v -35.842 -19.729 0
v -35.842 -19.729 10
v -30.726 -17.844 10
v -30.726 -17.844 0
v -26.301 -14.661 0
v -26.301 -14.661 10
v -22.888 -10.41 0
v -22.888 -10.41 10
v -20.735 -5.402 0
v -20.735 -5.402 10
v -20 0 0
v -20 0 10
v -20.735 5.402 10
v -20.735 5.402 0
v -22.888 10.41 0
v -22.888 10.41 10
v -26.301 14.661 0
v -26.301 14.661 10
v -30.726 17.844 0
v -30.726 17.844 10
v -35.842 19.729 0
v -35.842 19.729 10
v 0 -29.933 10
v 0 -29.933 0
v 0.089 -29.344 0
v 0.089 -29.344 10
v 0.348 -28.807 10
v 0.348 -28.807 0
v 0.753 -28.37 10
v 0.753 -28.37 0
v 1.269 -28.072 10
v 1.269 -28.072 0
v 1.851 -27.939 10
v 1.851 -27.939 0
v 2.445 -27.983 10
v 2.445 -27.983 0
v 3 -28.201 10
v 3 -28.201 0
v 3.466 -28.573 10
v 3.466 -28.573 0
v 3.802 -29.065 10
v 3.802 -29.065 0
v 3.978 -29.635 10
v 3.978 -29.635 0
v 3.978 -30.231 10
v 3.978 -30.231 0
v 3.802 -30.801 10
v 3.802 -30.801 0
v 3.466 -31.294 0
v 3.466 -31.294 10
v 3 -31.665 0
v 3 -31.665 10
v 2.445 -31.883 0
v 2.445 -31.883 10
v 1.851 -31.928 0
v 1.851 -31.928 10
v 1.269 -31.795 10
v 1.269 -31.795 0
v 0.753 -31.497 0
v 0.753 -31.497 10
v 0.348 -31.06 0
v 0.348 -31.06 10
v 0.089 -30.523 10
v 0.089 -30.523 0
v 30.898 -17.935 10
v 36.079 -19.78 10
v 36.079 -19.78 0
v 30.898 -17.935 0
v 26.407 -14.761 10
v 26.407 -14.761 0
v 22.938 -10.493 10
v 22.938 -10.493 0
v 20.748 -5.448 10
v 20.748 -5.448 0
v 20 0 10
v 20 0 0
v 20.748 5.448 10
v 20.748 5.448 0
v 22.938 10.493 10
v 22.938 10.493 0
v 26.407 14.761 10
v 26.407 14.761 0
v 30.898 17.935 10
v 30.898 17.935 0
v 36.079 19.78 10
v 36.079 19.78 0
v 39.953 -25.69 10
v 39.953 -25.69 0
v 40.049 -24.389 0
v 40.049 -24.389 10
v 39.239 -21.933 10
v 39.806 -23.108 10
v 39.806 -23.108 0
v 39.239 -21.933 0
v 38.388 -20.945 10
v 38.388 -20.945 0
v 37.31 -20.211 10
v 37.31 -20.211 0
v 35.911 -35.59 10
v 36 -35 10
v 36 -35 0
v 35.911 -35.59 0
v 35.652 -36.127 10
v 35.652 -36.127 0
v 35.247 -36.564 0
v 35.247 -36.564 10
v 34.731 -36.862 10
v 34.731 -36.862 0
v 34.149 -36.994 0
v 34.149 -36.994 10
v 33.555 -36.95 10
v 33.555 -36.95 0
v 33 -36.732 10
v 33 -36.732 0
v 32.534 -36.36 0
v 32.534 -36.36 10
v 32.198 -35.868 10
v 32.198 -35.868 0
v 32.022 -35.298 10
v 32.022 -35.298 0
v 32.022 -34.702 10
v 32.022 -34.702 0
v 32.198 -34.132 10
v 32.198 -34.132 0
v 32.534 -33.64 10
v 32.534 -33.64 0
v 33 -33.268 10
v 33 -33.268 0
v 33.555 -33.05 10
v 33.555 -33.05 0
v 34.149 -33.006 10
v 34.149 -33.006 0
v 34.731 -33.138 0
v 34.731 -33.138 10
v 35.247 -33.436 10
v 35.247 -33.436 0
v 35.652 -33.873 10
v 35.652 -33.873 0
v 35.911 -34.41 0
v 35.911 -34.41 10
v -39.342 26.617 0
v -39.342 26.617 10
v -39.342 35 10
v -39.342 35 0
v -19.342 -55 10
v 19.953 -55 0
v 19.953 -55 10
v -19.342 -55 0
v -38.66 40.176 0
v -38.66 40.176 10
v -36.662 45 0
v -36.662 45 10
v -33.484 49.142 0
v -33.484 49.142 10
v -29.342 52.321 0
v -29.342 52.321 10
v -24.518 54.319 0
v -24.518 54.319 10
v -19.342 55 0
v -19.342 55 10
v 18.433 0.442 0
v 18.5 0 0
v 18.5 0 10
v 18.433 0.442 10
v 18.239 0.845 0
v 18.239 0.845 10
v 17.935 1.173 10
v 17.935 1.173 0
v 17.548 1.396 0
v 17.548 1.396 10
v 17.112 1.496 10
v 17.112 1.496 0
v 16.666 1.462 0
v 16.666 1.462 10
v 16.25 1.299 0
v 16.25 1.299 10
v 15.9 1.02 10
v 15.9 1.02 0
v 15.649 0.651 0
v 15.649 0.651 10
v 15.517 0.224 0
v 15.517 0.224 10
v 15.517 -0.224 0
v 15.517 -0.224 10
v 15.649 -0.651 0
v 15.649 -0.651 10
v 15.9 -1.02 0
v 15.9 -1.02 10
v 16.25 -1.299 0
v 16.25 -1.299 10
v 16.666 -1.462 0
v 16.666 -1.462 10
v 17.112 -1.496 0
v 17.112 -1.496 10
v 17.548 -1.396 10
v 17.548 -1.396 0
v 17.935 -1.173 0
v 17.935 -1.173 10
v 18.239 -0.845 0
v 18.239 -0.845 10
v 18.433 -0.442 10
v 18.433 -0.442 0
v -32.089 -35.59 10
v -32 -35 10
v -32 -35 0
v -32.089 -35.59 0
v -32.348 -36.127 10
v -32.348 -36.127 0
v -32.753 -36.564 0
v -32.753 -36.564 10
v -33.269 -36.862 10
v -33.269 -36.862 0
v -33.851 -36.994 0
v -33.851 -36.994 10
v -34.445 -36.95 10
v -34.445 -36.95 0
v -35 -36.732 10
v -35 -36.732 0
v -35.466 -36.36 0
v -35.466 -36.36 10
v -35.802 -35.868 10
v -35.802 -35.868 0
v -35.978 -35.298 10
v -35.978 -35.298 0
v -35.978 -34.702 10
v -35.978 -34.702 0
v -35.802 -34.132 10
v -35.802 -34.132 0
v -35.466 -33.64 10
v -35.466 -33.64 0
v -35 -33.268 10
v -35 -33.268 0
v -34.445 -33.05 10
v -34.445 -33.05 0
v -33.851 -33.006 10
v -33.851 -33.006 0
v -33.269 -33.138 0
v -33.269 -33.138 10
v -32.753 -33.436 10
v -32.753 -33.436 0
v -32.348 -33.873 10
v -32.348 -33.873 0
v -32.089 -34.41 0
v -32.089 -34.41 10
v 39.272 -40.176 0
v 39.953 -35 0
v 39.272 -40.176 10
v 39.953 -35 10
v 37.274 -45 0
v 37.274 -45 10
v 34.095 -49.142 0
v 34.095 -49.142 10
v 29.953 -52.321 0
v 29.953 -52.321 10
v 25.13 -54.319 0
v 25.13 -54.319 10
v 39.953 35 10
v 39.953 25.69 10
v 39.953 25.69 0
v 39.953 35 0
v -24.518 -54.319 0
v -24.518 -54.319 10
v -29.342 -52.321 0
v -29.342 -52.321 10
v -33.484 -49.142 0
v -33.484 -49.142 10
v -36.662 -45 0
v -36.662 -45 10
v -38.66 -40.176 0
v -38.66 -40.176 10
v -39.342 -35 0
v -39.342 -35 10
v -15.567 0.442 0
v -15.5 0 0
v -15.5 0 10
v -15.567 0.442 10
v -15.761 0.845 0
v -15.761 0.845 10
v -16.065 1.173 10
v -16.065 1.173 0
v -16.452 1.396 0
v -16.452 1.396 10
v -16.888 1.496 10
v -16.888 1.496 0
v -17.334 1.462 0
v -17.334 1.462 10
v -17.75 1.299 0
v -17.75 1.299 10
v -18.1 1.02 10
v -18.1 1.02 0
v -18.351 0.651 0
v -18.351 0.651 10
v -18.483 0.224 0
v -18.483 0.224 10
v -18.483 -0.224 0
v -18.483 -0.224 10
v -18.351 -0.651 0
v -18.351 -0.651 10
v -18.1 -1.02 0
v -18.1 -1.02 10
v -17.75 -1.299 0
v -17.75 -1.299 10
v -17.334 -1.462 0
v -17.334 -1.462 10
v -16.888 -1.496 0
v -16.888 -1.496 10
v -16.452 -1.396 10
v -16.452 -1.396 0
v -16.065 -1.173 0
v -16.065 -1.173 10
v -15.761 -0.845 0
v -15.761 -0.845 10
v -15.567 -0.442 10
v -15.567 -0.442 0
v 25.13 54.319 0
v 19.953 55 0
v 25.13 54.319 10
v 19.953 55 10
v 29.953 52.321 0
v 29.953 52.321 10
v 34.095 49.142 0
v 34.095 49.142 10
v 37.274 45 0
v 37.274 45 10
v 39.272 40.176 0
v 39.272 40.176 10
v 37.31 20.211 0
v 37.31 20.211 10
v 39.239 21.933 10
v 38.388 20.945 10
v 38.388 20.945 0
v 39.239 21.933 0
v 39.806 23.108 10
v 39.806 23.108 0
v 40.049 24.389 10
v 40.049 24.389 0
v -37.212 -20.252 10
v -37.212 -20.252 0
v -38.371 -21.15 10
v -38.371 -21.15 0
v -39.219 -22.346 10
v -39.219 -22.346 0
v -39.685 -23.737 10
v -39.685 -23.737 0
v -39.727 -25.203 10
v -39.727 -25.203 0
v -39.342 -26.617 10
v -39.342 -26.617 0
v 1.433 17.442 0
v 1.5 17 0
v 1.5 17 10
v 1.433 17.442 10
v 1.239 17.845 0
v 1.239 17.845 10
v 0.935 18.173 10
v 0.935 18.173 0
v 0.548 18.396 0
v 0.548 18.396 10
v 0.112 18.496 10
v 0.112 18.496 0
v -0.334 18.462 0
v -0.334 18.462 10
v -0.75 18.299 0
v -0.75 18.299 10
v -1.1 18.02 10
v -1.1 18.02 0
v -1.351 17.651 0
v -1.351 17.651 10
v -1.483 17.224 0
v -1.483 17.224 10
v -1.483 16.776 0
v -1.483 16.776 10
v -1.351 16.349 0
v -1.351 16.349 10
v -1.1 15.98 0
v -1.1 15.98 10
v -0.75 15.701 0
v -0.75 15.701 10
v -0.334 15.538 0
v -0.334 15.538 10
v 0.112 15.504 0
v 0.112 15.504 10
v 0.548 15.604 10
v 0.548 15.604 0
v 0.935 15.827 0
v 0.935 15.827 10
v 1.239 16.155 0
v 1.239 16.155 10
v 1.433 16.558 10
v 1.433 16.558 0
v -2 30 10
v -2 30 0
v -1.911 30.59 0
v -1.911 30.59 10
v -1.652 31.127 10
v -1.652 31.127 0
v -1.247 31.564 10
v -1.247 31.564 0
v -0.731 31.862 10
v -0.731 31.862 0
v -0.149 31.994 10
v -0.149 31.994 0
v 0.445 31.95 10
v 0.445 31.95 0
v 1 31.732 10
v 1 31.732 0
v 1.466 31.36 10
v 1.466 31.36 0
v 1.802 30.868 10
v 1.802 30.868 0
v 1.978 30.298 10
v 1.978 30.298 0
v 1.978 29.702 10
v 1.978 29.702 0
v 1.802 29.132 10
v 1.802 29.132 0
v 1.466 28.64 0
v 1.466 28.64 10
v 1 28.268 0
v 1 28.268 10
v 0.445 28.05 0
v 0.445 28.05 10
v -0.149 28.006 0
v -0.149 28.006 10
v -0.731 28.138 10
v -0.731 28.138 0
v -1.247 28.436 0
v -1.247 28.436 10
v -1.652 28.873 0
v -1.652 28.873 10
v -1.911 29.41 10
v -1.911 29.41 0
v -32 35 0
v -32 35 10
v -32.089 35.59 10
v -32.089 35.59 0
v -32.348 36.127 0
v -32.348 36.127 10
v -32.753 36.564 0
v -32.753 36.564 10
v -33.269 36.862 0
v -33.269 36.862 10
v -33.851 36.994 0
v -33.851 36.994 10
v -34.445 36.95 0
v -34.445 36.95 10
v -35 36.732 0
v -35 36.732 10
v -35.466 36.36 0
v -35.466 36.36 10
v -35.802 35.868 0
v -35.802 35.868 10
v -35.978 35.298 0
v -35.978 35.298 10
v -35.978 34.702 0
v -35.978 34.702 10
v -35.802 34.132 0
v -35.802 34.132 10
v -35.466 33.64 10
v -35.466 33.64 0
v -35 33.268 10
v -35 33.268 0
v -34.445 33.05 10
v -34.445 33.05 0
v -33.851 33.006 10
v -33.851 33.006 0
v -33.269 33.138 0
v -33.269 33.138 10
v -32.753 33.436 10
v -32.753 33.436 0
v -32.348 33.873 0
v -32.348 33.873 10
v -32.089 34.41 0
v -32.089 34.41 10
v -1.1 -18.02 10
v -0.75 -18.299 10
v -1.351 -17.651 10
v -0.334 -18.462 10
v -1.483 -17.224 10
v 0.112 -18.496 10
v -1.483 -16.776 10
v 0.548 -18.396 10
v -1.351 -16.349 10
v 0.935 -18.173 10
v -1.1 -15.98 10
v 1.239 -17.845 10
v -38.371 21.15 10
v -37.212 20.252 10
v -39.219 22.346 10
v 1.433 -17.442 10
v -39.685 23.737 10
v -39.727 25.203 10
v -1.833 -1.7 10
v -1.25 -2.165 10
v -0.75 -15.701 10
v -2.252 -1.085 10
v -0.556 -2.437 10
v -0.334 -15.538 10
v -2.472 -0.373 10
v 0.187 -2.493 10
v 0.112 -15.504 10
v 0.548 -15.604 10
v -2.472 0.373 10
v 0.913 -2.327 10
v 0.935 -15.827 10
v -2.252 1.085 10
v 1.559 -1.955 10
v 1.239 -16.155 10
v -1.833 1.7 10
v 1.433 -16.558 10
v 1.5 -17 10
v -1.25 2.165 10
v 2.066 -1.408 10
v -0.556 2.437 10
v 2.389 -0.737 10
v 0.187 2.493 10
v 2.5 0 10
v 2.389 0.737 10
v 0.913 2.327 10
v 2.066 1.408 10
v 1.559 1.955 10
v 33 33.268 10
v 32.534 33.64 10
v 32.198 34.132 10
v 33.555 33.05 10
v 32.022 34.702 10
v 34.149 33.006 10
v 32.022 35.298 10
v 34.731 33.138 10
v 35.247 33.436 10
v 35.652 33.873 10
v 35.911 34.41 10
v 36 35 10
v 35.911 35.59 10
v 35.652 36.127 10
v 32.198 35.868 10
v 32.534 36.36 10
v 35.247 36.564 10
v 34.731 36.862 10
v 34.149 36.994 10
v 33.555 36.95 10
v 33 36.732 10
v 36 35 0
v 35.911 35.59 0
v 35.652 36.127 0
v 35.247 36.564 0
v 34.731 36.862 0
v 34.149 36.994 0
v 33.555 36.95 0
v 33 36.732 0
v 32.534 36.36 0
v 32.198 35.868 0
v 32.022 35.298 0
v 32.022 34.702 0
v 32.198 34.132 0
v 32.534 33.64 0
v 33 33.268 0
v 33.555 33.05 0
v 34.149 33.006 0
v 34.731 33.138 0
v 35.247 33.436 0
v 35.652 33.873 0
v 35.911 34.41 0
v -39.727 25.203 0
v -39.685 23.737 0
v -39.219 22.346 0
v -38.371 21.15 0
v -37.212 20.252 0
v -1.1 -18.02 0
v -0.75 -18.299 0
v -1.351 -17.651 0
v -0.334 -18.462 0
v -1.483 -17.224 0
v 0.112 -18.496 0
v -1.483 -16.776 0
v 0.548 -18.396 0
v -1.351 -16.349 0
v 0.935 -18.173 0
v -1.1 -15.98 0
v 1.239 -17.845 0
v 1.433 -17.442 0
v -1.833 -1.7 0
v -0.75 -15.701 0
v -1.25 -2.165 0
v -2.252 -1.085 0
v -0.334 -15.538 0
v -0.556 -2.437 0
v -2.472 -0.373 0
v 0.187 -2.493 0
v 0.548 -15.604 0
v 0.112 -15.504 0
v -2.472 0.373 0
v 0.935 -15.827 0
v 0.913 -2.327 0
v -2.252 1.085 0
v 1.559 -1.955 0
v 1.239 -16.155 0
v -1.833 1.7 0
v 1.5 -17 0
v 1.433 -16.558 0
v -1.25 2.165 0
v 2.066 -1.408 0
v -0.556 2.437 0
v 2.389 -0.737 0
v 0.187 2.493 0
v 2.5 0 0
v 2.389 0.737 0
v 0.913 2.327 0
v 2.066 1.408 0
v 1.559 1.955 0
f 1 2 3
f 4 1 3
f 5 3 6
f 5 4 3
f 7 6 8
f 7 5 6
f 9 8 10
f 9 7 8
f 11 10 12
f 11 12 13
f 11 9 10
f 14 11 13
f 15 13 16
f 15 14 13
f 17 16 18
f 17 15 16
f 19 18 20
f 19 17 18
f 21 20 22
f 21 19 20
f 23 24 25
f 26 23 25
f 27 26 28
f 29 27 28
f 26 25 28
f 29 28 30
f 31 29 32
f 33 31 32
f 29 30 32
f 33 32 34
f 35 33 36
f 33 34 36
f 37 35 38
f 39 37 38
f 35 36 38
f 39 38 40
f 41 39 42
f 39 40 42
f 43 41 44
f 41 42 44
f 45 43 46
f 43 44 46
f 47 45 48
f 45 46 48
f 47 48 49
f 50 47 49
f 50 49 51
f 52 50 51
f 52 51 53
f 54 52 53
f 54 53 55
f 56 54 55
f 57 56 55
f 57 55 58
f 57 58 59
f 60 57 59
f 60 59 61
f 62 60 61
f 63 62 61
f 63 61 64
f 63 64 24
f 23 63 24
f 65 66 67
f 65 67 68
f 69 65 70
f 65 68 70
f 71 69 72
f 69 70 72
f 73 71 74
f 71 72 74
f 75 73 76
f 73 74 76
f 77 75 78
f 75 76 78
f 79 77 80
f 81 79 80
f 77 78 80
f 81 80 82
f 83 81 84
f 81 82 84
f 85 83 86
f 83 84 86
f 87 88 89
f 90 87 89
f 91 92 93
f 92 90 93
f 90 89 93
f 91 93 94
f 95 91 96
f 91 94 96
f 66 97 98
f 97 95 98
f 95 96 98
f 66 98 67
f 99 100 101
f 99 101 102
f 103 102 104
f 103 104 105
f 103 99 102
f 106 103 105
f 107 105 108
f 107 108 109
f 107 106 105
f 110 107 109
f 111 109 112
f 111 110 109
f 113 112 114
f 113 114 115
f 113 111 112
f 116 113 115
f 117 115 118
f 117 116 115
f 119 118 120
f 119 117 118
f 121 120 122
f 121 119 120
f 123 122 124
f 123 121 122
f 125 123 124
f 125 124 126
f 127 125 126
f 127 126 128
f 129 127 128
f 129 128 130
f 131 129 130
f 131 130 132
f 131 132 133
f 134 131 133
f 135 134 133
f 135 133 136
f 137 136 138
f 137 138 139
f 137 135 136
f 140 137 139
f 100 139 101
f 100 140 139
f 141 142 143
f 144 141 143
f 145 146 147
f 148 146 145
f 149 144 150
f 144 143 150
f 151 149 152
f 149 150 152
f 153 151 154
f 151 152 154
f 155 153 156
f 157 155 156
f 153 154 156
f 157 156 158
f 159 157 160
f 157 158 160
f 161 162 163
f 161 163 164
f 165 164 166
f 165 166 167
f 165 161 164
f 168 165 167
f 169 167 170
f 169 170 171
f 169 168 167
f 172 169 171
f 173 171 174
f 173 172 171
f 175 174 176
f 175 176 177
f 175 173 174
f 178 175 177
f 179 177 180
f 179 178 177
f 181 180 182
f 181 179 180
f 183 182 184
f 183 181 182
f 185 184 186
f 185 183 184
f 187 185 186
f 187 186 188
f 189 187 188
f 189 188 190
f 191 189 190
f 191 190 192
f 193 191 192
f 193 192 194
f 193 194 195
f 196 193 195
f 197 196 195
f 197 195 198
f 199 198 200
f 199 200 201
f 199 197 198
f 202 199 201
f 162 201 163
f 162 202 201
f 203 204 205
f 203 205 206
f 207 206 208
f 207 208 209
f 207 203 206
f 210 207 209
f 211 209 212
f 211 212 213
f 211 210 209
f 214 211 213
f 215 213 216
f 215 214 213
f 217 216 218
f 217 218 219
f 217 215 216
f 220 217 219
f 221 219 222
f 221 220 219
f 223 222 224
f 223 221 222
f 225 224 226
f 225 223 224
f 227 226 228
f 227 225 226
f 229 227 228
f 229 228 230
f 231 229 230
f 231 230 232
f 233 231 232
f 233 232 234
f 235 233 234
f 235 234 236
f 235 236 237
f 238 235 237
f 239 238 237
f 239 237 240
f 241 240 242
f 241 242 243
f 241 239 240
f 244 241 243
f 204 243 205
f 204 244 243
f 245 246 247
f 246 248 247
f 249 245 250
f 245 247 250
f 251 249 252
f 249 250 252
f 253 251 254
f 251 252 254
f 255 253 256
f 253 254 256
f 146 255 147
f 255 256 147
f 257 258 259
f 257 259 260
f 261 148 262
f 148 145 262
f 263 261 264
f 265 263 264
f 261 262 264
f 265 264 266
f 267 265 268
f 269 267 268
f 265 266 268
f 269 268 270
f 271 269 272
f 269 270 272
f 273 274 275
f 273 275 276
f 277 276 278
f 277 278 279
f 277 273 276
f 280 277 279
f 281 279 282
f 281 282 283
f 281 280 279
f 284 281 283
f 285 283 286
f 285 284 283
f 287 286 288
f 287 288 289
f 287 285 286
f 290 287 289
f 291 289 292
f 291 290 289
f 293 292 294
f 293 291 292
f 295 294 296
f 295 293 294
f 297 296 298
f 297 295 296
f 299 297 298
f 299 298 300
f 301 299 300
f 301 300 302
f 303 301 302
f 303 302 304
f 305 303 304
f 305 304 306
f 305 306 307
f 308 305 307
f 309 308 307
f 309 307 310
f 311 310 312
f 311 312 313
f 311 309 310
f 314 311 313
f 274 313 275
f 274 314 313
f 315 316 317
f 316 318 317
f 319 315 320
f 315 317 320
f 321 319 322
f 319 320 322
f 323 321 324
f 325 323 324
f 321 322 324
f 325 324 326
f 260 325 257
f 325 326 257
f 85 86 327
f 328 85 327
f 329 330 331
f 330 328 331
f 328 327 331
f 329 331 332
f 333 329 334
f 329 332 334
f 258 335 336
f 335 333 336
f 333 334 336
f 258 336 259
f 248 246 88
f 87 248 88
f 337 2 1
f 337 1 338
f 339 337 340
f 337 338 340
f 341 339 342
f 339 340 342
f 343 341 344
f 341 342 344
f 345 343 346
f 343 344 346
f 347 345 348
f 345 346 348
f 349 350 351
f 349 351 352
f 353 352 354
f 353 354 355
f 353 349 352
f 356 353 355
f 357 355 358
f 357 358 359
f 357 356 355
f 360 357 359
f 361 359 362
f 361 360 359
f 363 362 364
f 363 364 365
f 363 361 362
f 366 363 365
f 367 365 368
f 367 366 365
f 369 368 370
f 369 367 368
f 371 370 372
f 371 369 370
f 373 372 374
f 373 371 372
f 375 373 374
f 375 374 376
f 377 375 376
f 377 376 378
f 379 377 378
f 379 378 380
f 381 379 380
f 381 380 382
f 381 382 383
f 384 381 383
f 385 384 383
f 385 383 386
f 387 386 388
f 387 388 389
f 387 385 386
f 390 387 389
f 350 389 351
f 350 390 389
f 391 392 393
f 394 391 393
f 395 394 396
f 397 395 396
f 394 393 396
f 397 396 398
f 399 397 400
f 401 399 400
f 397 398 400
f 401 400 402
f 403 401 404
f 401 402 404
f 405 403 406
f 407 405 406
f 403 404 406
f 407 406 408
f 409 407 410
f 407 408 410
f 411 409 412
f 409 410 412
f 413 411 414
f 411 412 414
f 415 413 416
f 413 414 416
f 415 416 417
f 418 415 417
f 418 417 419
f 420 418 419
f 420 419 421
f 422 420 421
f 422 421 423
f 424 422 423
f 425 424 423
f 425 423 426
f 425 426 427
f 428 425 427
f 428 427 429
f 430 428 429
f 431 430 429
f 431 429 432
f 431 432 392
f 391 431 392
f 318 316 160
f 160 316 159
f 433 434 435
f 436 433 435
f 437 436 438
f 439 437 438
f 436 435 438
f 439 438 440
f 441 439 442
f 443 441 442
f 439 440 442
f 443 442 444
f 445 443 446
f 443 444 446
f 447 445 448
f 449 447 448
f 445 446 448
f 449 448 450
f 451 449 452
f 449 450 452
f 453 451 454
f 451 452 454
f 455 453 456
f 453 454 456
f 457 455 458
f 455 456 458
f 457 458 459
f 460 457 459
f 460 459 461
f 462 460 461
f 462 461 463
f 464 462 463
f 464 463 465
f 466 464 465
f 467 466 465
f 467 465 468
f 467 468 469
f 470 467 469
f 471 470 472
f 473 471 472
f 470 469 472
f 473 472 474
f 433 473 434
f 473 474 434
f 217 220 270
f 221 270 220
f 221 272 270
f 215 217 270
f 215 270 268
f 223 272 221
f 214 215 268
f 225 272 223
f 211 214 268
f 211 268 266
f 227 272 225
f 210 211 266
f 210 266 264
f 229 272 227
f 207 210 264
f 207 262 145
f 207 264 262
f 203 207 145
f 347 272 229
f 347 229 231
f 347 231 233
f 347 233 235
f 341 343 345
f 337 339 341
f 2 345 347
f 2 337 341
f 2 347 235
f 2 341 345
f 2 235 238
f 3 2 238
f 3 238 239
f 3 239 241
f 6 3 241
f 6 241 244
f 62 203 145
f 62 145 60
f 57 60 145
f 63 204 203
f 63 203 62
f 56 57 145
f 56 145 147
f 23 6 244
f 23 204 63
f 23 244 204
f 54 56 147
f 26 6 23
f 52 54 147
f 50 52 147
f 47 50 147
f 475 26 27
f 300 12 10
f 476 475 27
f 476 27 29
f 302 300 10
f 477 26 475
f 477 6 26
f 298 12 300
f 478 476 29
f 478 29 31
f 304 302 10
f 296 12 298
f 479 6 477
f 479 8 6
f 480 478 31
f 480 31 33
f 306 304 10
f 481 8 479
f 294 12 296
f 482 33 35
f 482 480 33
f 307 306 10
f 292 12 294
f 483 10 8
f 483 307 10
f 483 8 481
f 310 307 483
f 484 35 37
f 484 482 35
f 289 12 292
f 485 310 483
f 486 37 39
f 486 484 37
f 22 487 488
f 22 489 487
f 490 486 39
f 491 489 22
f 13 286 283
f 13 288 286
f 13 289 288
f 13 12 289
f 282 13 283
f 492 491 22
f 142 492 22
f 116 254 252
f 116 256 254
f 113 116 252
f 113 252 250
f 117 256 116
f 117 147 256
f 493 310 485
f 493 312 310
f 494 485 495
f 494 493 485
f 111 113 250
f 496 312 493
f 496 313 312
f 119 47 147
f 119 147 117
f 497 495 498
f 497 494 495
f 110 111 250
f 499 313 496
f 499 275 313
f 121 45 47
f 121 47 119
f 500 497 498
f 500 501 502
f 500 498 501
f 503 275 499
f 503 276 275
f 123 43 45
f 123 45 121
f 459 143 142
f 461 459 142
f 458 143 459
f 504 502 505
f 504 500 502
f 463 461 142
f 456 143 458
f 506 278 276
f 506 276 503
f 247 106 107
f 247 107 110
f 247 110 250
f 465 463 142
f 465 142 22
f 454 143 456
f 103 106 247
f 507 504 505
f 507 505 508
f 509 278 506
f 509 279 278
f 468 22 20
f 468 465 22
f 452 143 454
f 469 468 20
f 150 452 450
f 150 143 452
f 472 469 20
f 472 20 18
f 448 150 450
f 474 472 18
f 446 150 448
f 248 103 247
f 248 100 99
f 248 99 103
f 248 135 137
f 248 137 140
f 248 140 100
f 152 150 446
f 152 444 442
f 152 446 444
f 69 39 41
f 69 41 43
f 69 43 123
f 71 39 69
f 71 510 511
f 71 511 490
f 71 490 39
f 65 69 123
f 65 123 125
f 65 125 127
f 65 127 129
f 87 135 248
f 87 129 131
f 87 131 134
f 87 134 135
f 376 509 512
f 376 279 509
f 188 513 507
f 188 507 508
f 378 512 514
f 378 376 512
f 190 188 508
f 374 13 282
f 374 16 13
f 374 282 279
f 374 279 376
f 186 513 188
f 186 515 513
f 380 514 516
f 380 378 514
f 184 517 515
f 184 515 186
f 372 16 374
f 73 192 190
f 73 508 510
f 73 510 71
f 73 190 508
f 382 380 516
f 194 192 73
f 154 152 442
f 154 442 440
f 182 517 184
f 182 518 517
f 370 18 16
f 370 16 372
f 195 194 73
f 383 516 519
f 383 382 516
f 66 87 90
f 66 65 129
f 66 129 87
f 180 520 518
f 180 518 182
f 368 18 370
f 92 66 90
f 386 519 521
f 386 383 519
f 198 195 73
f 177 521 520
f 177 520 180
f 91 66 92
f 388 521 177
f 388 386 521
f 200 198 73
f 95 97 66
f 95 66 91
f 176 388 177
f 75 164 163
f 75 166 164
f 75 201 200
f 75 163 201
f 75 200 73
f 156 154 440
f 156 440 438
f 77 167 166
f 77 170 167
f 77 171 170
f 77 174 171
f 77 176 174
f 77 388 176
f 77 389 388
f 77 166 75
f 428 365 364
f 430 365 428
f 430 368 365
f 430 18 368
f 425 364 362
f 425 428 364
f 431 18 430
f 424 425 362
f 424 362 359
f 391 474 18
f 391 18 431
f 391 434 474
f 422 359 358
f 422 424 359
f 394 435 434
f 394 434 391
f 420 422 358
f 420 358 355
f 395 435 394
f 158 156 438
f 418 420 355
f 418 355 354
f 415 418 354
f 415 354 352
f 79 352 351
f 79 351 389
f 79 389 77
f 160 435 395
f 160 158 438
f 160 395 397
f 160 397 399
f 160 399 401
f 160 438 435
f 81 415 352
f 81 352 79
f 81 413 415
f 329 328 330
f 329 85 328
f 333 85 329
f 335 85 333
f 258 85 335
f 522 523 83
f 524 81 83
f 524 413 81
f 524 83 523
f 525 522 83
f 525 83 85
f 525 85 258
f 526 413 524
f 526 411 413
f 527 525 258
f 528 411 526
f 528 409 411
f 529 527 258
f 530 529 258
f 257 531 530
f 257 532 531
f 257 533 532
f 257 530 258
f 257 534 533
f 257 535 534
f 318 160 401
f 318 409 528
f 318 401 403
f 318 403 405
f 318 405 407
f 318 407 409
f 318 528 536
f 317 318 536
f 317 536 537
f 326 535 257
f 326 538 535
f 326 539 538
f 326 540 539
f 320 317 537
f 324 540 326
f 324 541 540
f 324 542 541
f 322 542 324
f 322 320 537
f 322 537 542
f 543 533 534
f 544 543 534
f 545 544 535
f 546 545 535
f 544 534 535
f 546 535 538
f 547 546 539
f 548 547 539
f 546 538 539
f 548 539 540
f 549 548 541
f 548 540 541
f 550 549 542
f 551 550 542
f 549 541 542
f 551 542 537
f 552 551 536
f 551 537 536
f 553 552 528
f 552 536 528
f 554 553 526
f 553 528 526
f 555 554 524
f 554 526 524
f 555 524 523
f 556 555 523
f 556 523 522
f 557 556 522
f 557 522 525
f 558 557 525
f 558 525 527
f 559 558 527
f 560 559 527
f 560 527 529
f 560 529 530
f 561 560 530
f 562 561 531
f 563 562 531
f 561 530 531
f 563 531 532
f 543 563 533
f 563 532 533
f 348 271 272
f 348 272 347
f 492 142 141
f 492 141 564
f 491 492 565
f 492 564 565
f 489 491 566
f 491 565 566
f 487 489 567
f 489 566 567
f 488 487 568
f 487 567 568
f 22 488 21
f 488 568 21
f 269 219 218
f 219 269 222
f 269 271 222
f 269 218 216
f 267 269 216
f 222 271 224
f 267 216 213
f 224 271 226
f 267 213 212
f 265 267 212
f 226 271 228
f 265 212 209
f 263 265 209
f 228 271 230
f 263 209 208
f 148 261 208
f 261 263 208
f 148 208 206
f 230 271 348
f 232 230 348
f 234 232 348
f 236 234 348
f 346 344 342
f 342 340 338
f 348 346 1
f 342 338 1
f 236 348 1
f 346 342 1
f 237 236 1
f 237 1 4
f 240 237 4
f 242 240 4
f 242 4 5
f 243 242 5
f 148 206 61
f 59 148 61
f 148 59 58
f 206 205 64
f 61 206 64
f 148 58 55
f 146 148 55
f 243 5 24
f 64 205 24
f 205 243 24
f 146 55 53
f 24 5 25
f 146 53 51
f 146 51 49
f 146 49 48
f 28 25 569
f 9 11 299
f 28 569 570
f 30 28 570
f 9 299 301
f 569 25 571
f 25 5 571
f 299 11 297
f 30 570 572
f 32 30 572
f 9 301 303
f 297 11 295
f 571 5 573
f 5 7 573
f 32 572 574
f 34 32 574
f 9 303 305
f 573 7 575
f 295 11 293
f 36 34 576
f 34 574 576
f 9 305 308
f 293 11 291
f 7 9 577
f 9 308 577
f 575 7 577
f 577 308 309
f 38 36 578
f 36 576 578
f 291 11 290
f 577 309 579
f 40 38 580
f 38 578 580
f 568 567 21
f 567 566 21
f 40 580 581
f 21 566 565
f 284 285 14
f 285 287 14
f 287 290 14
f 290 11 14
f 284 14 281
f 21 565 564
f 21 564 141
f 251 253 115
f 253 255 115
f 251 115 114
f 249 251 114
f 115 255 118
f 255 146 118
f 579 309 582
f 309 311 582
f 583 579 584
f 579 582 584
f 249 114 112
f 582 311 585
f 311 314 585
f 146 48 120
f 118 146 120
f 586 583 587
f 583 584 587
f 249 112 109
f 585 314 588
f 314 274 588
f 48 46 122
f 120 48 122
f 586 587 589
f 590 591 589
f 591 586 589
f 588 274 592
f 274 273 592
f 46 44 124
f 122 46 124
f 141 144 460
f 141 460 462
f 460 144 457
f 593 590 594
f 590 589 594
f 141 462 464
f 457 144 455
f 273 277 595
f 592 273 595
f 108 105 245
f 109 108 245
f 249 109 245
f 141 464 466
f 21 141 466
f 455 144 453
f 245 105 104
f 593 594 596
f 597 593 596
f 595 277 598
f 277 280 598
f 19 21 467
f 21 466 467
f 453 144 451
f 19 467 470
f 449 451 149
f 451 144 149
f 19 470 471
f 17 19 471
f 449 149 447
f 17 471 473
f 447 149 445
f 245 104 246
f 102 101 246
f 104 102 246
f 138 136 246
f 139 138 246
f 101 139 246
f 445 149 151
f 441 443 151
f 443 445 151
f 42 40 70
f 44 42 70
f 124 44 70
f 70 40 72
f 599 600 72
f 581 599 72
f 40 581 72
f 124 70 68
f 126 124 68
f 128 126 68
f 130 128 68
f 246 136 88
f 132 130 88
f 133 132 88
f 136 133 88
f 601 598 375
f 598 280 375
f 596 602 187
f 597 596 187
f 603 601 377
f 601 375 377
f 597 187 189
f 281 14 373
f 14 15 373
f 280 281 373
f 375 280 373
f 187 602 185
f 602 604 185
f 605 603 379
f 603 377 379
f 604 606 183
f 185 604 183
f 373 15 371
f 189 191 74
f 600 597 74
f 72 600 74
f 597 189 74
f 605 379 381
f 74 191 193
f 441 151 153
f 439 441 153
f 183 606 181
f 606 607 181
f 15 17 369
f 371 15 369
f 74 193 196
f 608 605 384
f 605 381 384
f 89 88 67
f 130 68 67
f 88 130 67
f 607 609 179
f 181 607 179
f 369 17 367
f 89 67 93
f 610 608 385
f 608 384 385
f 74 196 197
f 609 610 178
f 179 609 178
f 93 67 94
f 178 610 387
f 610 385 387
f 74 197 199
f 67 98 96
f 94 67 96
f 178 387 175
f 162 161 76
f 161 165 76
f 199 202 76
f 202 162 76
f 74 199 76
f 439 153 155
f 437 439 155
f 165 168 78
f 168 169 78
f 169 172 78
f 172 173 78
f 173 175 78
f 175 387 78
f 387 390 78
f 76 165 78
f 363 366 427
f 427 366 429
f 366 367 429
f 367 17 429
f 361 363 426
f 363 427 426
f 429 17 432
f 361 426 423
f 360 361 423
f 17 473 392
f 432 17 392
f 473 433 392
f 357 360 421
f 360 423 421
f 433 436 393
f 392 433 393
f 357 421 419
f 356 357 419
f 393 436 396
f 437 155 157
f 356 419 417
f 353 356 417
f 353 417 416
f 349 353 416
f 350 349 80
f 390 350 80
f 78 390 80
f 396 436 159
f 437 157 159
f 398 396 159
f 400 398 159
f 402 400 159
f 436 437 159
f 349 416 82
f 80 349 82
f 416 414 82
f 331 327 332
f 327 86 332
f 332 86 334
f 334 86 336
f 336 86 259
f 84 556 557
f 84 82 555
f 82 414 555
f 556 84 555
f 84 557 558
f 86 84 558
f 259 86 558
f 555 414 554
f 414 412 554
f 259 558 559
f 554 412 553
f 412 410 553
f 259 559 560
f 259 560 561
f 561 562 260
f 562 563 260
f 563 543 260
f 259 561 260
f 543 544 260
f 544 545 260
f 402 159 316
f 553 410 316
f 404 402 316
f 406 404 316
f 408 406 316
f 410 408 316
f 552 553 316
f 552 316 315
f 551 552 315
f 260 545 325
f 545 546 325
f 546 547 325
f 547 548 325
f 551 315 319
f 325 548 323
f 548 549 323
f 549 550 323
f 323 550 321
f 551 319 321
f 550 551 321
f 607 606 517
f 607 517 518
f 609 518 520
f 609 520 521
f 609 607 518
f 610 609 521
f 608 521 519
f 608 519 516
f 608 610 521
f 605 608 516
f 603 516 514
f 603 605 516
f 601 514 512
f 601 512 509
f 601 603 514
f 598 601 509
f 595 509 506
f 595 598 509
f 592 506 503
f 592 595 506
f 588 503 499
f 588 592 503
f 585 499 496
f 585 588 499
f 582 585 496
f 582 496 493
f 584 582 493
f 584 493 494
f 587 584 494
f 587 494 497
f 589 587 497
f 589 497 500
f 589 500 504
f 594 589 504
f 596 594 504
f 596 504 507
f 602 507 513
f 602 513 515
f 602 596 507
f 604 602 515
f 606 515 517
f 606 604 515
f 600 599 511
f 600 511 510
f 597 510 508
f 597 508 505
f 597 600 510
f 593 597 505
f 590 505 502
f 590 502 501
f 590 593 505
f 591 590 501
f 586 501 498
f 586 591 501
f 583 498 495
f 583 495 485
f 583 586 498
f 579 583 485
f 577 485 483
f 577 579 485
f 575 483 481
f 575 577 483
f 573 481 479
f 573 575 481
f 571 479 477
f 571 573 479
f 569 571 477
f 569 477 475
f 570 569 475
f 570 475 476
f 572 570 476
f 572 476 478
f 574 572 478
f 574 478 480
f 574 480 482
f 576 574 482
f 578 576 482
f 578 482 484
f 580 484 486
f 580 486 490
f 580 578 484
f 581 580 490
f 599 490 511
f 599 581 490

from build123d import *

# Parameters (mm, degrees)
SKETCH1_R           = 47.5
SKETCH1_R_2         = 2.5
SKETCH1_R_3         = 1.5
BOSS_EXTRUDE1_DEPTH = 10
SKETCH7_W           = 79.294879448
SKETCH7_H           = 30
BOSS_EXTRUDE3_DEPTH = 10
SKETCH3_R           = 2
CUT_EXTRUDE1_DEPTH  = 10
CUT_EXTRUDE2_START  = -10
CUT_EXTRUDE2_DEPTH  = 10
FILLET2_R           = 5
FILLET3_R           = 20
SKETCH8_R           = 2
CUT_EXTRUDE3_DEPTH  = 20


with BuildPart() as part:
    # Sketch1 → Boss-Extrude1 (new body)
    with BuildSketch(Plane.XY):
        Circle(SKETCH1_R)
        Circle(SKETCH1_R_2, mode=Mode.SUBTRACT)
        with Locations((0, 17)):
            Circle(SKETCH1_R_3, mode=Mode.SUBTRACT)
        with Locations((17, 0)):
            Circle(SKETCH1_R_3, mode=Mode.SUBTRACT)
        with Locations((0, -17)):
            Circle(SKETCH1_R_3, mode=Mode.SUBTRACT)
        with Locations((-17, 0)):
            Circle(SKETCH1_R_3, mode=Mode.SUBTRACT)
    extrude(amount=BOSS_EXTRUDE1_DEPTH)

    # Sketch7 → Boss-Extrude3 (add)
    with BuildSketch(Plane(origin=(0, 0, 0), x_dir=(-1, 0, 0), z_dir=(0, 0, -1))):
        with Locations((-0.305848536, 40)):
            Rectangle(SKETCH7_W, SKETCH7_H)
        with Locations((-0.305848536, -40)):
            Rectangle(SKETCH7_W, SKETCH7_H)
    extrude(amount=-BOSS_EXTRUDE3_DEPTH)

    # Sketch3 → Cut-Extrude1 (cut)
    with BuildSketch(Plane.XY.offset(10)):
        with Locations((-34, 35)):
            Circle(SKETCH3_R)
        with Locations((34, 35)):
            Circle(SKETCH3_R)
    cut_extrude1 = extrude(amount=-CUT_EXTRUDE1_DEPTH, mode=Mode.SUBTRACT)

    # Mirror1: Cut-Extrude1 across plane
    add(cut_extrude1.mirror(Plane.ZX), mode=Mode.SUBTRACT)

    # Sketch4 → Cut-Extrude2 (cut)
    with BuildSketch(Plane.XY.offset(10).offset(CUT_EXTRUDE2_START)):
        with BuildLine():
            ThreePointArc((-43.084219849, 20), (-47.5, 0), (-43.084219849, -20))
            ThreePointArc((-43.084219849, -20), (-20, 0), (-43.084219849, 20))
        make_face()
        with BuildLine():
            ThreePointArc((43.084219849, 20), (47.5, 0), (43.084219849, -20))
            ThreePointArc((43.084219849, -20), (20, 0), (43.084219849, 20))
        make_face()
    extrude(amount=CUT_EXTRUDE2_DEPTH, mode=Mode.SUBTRACT)

    # Fillet2
    # the kernel refuses this fillet: 5 mm, written as the material it takes off along each edge
    with BuildSketch(Plane(origin=(43.084219849, -20, -17.522188683), x_dir=(-0.4820770193525399, -0.8761288417876509, 0), z_dir=(0, 0, 1))) as fillet2_piece_1:
        with BuildLine():
            CenterArc((7.965064209, -4.7789061), FILLET2_R, 107.102298128, 89.932791817)
            Line((3.18443662, -6.243692723), (3.088824068, -6.272988455))
            ThreePointArc((3.088824068, -6.272988455), (1.775921643, -3.02815315), (-0.079852724, -0.060195867))
            Line((-0.079852724, -0.060195867), (-0.006836496, 0.099766038))
            ThreePointArc((-0.006836496, 0.099766038), (3.24733545, 0.211131977), (6.465263034, 0.095578122))
            Line((6.465263034, 0.095578122), (6.4946709, 0))
        make_face()
    extrude(amount=45.044377366, mode=Mode.SUBTRACT)
    with BuildSketch(Plane(origin=(43.084219849, 20, -17.522188683), x_dir=(-0.9995074123131517, -0.03138363795144594, 0), z_dir=(0, 0, 1))) as fillet2_piece_2:
        with BuildLine():
            CenterArc((7.876051386, -4.92422643), FILLET2_R, 99.987608256, 89.932791817)
            Line((2.950811143, -5.78562561), (2.852306338, -5.802853594))
            ThreePointArc((2.852306338, -5.802853594), (1.28732359, -2.988739235), (-0.091980358, -0.039237913))
            Line((-0.091980358, -0.039237913), (0.017343518, 0.098484529))
            ThreePointArc((0.017343518, 0.098484529), (3.504437737, -0.206216713), (6.991531955, 0.098484529))
            Line((6.991531955, 0.098484529), (7.008875473, 0))
        make_face()
    extrude(amount=45.044377366, mode=Mode.SUBTRACT)
    with BuildSketch(Plane(origin=(-43.084219849, 20, -19.006257622), x_dir=(0.9993011358017984, -0.037379673423339595, 0), z_dir=(0, 0, 1))) as fillet2_piece_3:
        with BuildLine():
            CenterArc((8.144232965, 4.918935136), FILLET2_R, 158.484077447, 101.184563019)
            Line((3.49265456, 6.752734019), (3.399622992, 6.789409997))
            ThreePointArc((3.399622992, 6.789409997), (1.522188613, 3.492296192), (-0.092214112, 0.038685366))
            Line((-0.092214112, 0.038685366), (0.01793407, -0.098378703))
            ThreePointArc((0.01793407, -0.098378703), (3.623764745, 0.227599929), (7.22959542, -0.098378703))
            Line((7.22959542, -0.098378703), (7.247529489, 0))
        make_face()
    extrude(amount=48.012515244, mode=Mode.SUBTRACT)
    with BuildSketch(Plane(origin=(-43.084219849, -20, -19.006257622), x_dir=(0.4922890050047702, -0.8704318098228104, 0), z_dir=(0, 0, 1))) as fillet2_piece_4:
        with BuildLine():
            CenterArc((8.110651537, 4.97411149), FILLET2_R, 162.982413534, 101.184563019)
            Line((3.329576688, 6.437437594), (3.233955191, 6.466704116))
            ThreePointArc((3.233955191, 6.466704116), (1.866948313, 3.114157454), (-0.079143369, 0.061125503))
            Line((-0.079143369, 0.061125503), (-0.008002635, -0.099679275))
            ThreePointArc((-0.008002635, -0.099679275), (3.801251524, -0.252344442), (7.592340079, -0.09948223))
            Line((7.592340079, -0.09948223), (7.602503049, 0))
        make_face()
    extrude(amount=48.012515244, mode=Mode.SUBTRACT)

    # Fillet3
    fillet3_edges = [part.edges().sort_by_distance(p)[0] for p in [
        (-39.341591188, 55, 5),
        (39.95328826, 55, 5),
        (39.95328826, -55, 5),
        (-39.341591188, -55, 5),
    ]]
    fillet(fillet3_edges, radius=FILLET3_R)

    # Sketch8 → Cut-Extrude3 (cut)
    with BuildSketch(Plane(origin=(0, 0, 0), x_dir=(-1, 0, 0), z_dir=(0, 0, -1))):
        with Locations((0, 30)):
            Circle(SKETCH8_R)
        with Locations((-2, -29.933259094)):
            Circle(SKETCH8_R)
    extrude(amount=-CUT_EXTRUDE3_DEPTH, mode=Mode.SUBTRACT)


solid = part.part
